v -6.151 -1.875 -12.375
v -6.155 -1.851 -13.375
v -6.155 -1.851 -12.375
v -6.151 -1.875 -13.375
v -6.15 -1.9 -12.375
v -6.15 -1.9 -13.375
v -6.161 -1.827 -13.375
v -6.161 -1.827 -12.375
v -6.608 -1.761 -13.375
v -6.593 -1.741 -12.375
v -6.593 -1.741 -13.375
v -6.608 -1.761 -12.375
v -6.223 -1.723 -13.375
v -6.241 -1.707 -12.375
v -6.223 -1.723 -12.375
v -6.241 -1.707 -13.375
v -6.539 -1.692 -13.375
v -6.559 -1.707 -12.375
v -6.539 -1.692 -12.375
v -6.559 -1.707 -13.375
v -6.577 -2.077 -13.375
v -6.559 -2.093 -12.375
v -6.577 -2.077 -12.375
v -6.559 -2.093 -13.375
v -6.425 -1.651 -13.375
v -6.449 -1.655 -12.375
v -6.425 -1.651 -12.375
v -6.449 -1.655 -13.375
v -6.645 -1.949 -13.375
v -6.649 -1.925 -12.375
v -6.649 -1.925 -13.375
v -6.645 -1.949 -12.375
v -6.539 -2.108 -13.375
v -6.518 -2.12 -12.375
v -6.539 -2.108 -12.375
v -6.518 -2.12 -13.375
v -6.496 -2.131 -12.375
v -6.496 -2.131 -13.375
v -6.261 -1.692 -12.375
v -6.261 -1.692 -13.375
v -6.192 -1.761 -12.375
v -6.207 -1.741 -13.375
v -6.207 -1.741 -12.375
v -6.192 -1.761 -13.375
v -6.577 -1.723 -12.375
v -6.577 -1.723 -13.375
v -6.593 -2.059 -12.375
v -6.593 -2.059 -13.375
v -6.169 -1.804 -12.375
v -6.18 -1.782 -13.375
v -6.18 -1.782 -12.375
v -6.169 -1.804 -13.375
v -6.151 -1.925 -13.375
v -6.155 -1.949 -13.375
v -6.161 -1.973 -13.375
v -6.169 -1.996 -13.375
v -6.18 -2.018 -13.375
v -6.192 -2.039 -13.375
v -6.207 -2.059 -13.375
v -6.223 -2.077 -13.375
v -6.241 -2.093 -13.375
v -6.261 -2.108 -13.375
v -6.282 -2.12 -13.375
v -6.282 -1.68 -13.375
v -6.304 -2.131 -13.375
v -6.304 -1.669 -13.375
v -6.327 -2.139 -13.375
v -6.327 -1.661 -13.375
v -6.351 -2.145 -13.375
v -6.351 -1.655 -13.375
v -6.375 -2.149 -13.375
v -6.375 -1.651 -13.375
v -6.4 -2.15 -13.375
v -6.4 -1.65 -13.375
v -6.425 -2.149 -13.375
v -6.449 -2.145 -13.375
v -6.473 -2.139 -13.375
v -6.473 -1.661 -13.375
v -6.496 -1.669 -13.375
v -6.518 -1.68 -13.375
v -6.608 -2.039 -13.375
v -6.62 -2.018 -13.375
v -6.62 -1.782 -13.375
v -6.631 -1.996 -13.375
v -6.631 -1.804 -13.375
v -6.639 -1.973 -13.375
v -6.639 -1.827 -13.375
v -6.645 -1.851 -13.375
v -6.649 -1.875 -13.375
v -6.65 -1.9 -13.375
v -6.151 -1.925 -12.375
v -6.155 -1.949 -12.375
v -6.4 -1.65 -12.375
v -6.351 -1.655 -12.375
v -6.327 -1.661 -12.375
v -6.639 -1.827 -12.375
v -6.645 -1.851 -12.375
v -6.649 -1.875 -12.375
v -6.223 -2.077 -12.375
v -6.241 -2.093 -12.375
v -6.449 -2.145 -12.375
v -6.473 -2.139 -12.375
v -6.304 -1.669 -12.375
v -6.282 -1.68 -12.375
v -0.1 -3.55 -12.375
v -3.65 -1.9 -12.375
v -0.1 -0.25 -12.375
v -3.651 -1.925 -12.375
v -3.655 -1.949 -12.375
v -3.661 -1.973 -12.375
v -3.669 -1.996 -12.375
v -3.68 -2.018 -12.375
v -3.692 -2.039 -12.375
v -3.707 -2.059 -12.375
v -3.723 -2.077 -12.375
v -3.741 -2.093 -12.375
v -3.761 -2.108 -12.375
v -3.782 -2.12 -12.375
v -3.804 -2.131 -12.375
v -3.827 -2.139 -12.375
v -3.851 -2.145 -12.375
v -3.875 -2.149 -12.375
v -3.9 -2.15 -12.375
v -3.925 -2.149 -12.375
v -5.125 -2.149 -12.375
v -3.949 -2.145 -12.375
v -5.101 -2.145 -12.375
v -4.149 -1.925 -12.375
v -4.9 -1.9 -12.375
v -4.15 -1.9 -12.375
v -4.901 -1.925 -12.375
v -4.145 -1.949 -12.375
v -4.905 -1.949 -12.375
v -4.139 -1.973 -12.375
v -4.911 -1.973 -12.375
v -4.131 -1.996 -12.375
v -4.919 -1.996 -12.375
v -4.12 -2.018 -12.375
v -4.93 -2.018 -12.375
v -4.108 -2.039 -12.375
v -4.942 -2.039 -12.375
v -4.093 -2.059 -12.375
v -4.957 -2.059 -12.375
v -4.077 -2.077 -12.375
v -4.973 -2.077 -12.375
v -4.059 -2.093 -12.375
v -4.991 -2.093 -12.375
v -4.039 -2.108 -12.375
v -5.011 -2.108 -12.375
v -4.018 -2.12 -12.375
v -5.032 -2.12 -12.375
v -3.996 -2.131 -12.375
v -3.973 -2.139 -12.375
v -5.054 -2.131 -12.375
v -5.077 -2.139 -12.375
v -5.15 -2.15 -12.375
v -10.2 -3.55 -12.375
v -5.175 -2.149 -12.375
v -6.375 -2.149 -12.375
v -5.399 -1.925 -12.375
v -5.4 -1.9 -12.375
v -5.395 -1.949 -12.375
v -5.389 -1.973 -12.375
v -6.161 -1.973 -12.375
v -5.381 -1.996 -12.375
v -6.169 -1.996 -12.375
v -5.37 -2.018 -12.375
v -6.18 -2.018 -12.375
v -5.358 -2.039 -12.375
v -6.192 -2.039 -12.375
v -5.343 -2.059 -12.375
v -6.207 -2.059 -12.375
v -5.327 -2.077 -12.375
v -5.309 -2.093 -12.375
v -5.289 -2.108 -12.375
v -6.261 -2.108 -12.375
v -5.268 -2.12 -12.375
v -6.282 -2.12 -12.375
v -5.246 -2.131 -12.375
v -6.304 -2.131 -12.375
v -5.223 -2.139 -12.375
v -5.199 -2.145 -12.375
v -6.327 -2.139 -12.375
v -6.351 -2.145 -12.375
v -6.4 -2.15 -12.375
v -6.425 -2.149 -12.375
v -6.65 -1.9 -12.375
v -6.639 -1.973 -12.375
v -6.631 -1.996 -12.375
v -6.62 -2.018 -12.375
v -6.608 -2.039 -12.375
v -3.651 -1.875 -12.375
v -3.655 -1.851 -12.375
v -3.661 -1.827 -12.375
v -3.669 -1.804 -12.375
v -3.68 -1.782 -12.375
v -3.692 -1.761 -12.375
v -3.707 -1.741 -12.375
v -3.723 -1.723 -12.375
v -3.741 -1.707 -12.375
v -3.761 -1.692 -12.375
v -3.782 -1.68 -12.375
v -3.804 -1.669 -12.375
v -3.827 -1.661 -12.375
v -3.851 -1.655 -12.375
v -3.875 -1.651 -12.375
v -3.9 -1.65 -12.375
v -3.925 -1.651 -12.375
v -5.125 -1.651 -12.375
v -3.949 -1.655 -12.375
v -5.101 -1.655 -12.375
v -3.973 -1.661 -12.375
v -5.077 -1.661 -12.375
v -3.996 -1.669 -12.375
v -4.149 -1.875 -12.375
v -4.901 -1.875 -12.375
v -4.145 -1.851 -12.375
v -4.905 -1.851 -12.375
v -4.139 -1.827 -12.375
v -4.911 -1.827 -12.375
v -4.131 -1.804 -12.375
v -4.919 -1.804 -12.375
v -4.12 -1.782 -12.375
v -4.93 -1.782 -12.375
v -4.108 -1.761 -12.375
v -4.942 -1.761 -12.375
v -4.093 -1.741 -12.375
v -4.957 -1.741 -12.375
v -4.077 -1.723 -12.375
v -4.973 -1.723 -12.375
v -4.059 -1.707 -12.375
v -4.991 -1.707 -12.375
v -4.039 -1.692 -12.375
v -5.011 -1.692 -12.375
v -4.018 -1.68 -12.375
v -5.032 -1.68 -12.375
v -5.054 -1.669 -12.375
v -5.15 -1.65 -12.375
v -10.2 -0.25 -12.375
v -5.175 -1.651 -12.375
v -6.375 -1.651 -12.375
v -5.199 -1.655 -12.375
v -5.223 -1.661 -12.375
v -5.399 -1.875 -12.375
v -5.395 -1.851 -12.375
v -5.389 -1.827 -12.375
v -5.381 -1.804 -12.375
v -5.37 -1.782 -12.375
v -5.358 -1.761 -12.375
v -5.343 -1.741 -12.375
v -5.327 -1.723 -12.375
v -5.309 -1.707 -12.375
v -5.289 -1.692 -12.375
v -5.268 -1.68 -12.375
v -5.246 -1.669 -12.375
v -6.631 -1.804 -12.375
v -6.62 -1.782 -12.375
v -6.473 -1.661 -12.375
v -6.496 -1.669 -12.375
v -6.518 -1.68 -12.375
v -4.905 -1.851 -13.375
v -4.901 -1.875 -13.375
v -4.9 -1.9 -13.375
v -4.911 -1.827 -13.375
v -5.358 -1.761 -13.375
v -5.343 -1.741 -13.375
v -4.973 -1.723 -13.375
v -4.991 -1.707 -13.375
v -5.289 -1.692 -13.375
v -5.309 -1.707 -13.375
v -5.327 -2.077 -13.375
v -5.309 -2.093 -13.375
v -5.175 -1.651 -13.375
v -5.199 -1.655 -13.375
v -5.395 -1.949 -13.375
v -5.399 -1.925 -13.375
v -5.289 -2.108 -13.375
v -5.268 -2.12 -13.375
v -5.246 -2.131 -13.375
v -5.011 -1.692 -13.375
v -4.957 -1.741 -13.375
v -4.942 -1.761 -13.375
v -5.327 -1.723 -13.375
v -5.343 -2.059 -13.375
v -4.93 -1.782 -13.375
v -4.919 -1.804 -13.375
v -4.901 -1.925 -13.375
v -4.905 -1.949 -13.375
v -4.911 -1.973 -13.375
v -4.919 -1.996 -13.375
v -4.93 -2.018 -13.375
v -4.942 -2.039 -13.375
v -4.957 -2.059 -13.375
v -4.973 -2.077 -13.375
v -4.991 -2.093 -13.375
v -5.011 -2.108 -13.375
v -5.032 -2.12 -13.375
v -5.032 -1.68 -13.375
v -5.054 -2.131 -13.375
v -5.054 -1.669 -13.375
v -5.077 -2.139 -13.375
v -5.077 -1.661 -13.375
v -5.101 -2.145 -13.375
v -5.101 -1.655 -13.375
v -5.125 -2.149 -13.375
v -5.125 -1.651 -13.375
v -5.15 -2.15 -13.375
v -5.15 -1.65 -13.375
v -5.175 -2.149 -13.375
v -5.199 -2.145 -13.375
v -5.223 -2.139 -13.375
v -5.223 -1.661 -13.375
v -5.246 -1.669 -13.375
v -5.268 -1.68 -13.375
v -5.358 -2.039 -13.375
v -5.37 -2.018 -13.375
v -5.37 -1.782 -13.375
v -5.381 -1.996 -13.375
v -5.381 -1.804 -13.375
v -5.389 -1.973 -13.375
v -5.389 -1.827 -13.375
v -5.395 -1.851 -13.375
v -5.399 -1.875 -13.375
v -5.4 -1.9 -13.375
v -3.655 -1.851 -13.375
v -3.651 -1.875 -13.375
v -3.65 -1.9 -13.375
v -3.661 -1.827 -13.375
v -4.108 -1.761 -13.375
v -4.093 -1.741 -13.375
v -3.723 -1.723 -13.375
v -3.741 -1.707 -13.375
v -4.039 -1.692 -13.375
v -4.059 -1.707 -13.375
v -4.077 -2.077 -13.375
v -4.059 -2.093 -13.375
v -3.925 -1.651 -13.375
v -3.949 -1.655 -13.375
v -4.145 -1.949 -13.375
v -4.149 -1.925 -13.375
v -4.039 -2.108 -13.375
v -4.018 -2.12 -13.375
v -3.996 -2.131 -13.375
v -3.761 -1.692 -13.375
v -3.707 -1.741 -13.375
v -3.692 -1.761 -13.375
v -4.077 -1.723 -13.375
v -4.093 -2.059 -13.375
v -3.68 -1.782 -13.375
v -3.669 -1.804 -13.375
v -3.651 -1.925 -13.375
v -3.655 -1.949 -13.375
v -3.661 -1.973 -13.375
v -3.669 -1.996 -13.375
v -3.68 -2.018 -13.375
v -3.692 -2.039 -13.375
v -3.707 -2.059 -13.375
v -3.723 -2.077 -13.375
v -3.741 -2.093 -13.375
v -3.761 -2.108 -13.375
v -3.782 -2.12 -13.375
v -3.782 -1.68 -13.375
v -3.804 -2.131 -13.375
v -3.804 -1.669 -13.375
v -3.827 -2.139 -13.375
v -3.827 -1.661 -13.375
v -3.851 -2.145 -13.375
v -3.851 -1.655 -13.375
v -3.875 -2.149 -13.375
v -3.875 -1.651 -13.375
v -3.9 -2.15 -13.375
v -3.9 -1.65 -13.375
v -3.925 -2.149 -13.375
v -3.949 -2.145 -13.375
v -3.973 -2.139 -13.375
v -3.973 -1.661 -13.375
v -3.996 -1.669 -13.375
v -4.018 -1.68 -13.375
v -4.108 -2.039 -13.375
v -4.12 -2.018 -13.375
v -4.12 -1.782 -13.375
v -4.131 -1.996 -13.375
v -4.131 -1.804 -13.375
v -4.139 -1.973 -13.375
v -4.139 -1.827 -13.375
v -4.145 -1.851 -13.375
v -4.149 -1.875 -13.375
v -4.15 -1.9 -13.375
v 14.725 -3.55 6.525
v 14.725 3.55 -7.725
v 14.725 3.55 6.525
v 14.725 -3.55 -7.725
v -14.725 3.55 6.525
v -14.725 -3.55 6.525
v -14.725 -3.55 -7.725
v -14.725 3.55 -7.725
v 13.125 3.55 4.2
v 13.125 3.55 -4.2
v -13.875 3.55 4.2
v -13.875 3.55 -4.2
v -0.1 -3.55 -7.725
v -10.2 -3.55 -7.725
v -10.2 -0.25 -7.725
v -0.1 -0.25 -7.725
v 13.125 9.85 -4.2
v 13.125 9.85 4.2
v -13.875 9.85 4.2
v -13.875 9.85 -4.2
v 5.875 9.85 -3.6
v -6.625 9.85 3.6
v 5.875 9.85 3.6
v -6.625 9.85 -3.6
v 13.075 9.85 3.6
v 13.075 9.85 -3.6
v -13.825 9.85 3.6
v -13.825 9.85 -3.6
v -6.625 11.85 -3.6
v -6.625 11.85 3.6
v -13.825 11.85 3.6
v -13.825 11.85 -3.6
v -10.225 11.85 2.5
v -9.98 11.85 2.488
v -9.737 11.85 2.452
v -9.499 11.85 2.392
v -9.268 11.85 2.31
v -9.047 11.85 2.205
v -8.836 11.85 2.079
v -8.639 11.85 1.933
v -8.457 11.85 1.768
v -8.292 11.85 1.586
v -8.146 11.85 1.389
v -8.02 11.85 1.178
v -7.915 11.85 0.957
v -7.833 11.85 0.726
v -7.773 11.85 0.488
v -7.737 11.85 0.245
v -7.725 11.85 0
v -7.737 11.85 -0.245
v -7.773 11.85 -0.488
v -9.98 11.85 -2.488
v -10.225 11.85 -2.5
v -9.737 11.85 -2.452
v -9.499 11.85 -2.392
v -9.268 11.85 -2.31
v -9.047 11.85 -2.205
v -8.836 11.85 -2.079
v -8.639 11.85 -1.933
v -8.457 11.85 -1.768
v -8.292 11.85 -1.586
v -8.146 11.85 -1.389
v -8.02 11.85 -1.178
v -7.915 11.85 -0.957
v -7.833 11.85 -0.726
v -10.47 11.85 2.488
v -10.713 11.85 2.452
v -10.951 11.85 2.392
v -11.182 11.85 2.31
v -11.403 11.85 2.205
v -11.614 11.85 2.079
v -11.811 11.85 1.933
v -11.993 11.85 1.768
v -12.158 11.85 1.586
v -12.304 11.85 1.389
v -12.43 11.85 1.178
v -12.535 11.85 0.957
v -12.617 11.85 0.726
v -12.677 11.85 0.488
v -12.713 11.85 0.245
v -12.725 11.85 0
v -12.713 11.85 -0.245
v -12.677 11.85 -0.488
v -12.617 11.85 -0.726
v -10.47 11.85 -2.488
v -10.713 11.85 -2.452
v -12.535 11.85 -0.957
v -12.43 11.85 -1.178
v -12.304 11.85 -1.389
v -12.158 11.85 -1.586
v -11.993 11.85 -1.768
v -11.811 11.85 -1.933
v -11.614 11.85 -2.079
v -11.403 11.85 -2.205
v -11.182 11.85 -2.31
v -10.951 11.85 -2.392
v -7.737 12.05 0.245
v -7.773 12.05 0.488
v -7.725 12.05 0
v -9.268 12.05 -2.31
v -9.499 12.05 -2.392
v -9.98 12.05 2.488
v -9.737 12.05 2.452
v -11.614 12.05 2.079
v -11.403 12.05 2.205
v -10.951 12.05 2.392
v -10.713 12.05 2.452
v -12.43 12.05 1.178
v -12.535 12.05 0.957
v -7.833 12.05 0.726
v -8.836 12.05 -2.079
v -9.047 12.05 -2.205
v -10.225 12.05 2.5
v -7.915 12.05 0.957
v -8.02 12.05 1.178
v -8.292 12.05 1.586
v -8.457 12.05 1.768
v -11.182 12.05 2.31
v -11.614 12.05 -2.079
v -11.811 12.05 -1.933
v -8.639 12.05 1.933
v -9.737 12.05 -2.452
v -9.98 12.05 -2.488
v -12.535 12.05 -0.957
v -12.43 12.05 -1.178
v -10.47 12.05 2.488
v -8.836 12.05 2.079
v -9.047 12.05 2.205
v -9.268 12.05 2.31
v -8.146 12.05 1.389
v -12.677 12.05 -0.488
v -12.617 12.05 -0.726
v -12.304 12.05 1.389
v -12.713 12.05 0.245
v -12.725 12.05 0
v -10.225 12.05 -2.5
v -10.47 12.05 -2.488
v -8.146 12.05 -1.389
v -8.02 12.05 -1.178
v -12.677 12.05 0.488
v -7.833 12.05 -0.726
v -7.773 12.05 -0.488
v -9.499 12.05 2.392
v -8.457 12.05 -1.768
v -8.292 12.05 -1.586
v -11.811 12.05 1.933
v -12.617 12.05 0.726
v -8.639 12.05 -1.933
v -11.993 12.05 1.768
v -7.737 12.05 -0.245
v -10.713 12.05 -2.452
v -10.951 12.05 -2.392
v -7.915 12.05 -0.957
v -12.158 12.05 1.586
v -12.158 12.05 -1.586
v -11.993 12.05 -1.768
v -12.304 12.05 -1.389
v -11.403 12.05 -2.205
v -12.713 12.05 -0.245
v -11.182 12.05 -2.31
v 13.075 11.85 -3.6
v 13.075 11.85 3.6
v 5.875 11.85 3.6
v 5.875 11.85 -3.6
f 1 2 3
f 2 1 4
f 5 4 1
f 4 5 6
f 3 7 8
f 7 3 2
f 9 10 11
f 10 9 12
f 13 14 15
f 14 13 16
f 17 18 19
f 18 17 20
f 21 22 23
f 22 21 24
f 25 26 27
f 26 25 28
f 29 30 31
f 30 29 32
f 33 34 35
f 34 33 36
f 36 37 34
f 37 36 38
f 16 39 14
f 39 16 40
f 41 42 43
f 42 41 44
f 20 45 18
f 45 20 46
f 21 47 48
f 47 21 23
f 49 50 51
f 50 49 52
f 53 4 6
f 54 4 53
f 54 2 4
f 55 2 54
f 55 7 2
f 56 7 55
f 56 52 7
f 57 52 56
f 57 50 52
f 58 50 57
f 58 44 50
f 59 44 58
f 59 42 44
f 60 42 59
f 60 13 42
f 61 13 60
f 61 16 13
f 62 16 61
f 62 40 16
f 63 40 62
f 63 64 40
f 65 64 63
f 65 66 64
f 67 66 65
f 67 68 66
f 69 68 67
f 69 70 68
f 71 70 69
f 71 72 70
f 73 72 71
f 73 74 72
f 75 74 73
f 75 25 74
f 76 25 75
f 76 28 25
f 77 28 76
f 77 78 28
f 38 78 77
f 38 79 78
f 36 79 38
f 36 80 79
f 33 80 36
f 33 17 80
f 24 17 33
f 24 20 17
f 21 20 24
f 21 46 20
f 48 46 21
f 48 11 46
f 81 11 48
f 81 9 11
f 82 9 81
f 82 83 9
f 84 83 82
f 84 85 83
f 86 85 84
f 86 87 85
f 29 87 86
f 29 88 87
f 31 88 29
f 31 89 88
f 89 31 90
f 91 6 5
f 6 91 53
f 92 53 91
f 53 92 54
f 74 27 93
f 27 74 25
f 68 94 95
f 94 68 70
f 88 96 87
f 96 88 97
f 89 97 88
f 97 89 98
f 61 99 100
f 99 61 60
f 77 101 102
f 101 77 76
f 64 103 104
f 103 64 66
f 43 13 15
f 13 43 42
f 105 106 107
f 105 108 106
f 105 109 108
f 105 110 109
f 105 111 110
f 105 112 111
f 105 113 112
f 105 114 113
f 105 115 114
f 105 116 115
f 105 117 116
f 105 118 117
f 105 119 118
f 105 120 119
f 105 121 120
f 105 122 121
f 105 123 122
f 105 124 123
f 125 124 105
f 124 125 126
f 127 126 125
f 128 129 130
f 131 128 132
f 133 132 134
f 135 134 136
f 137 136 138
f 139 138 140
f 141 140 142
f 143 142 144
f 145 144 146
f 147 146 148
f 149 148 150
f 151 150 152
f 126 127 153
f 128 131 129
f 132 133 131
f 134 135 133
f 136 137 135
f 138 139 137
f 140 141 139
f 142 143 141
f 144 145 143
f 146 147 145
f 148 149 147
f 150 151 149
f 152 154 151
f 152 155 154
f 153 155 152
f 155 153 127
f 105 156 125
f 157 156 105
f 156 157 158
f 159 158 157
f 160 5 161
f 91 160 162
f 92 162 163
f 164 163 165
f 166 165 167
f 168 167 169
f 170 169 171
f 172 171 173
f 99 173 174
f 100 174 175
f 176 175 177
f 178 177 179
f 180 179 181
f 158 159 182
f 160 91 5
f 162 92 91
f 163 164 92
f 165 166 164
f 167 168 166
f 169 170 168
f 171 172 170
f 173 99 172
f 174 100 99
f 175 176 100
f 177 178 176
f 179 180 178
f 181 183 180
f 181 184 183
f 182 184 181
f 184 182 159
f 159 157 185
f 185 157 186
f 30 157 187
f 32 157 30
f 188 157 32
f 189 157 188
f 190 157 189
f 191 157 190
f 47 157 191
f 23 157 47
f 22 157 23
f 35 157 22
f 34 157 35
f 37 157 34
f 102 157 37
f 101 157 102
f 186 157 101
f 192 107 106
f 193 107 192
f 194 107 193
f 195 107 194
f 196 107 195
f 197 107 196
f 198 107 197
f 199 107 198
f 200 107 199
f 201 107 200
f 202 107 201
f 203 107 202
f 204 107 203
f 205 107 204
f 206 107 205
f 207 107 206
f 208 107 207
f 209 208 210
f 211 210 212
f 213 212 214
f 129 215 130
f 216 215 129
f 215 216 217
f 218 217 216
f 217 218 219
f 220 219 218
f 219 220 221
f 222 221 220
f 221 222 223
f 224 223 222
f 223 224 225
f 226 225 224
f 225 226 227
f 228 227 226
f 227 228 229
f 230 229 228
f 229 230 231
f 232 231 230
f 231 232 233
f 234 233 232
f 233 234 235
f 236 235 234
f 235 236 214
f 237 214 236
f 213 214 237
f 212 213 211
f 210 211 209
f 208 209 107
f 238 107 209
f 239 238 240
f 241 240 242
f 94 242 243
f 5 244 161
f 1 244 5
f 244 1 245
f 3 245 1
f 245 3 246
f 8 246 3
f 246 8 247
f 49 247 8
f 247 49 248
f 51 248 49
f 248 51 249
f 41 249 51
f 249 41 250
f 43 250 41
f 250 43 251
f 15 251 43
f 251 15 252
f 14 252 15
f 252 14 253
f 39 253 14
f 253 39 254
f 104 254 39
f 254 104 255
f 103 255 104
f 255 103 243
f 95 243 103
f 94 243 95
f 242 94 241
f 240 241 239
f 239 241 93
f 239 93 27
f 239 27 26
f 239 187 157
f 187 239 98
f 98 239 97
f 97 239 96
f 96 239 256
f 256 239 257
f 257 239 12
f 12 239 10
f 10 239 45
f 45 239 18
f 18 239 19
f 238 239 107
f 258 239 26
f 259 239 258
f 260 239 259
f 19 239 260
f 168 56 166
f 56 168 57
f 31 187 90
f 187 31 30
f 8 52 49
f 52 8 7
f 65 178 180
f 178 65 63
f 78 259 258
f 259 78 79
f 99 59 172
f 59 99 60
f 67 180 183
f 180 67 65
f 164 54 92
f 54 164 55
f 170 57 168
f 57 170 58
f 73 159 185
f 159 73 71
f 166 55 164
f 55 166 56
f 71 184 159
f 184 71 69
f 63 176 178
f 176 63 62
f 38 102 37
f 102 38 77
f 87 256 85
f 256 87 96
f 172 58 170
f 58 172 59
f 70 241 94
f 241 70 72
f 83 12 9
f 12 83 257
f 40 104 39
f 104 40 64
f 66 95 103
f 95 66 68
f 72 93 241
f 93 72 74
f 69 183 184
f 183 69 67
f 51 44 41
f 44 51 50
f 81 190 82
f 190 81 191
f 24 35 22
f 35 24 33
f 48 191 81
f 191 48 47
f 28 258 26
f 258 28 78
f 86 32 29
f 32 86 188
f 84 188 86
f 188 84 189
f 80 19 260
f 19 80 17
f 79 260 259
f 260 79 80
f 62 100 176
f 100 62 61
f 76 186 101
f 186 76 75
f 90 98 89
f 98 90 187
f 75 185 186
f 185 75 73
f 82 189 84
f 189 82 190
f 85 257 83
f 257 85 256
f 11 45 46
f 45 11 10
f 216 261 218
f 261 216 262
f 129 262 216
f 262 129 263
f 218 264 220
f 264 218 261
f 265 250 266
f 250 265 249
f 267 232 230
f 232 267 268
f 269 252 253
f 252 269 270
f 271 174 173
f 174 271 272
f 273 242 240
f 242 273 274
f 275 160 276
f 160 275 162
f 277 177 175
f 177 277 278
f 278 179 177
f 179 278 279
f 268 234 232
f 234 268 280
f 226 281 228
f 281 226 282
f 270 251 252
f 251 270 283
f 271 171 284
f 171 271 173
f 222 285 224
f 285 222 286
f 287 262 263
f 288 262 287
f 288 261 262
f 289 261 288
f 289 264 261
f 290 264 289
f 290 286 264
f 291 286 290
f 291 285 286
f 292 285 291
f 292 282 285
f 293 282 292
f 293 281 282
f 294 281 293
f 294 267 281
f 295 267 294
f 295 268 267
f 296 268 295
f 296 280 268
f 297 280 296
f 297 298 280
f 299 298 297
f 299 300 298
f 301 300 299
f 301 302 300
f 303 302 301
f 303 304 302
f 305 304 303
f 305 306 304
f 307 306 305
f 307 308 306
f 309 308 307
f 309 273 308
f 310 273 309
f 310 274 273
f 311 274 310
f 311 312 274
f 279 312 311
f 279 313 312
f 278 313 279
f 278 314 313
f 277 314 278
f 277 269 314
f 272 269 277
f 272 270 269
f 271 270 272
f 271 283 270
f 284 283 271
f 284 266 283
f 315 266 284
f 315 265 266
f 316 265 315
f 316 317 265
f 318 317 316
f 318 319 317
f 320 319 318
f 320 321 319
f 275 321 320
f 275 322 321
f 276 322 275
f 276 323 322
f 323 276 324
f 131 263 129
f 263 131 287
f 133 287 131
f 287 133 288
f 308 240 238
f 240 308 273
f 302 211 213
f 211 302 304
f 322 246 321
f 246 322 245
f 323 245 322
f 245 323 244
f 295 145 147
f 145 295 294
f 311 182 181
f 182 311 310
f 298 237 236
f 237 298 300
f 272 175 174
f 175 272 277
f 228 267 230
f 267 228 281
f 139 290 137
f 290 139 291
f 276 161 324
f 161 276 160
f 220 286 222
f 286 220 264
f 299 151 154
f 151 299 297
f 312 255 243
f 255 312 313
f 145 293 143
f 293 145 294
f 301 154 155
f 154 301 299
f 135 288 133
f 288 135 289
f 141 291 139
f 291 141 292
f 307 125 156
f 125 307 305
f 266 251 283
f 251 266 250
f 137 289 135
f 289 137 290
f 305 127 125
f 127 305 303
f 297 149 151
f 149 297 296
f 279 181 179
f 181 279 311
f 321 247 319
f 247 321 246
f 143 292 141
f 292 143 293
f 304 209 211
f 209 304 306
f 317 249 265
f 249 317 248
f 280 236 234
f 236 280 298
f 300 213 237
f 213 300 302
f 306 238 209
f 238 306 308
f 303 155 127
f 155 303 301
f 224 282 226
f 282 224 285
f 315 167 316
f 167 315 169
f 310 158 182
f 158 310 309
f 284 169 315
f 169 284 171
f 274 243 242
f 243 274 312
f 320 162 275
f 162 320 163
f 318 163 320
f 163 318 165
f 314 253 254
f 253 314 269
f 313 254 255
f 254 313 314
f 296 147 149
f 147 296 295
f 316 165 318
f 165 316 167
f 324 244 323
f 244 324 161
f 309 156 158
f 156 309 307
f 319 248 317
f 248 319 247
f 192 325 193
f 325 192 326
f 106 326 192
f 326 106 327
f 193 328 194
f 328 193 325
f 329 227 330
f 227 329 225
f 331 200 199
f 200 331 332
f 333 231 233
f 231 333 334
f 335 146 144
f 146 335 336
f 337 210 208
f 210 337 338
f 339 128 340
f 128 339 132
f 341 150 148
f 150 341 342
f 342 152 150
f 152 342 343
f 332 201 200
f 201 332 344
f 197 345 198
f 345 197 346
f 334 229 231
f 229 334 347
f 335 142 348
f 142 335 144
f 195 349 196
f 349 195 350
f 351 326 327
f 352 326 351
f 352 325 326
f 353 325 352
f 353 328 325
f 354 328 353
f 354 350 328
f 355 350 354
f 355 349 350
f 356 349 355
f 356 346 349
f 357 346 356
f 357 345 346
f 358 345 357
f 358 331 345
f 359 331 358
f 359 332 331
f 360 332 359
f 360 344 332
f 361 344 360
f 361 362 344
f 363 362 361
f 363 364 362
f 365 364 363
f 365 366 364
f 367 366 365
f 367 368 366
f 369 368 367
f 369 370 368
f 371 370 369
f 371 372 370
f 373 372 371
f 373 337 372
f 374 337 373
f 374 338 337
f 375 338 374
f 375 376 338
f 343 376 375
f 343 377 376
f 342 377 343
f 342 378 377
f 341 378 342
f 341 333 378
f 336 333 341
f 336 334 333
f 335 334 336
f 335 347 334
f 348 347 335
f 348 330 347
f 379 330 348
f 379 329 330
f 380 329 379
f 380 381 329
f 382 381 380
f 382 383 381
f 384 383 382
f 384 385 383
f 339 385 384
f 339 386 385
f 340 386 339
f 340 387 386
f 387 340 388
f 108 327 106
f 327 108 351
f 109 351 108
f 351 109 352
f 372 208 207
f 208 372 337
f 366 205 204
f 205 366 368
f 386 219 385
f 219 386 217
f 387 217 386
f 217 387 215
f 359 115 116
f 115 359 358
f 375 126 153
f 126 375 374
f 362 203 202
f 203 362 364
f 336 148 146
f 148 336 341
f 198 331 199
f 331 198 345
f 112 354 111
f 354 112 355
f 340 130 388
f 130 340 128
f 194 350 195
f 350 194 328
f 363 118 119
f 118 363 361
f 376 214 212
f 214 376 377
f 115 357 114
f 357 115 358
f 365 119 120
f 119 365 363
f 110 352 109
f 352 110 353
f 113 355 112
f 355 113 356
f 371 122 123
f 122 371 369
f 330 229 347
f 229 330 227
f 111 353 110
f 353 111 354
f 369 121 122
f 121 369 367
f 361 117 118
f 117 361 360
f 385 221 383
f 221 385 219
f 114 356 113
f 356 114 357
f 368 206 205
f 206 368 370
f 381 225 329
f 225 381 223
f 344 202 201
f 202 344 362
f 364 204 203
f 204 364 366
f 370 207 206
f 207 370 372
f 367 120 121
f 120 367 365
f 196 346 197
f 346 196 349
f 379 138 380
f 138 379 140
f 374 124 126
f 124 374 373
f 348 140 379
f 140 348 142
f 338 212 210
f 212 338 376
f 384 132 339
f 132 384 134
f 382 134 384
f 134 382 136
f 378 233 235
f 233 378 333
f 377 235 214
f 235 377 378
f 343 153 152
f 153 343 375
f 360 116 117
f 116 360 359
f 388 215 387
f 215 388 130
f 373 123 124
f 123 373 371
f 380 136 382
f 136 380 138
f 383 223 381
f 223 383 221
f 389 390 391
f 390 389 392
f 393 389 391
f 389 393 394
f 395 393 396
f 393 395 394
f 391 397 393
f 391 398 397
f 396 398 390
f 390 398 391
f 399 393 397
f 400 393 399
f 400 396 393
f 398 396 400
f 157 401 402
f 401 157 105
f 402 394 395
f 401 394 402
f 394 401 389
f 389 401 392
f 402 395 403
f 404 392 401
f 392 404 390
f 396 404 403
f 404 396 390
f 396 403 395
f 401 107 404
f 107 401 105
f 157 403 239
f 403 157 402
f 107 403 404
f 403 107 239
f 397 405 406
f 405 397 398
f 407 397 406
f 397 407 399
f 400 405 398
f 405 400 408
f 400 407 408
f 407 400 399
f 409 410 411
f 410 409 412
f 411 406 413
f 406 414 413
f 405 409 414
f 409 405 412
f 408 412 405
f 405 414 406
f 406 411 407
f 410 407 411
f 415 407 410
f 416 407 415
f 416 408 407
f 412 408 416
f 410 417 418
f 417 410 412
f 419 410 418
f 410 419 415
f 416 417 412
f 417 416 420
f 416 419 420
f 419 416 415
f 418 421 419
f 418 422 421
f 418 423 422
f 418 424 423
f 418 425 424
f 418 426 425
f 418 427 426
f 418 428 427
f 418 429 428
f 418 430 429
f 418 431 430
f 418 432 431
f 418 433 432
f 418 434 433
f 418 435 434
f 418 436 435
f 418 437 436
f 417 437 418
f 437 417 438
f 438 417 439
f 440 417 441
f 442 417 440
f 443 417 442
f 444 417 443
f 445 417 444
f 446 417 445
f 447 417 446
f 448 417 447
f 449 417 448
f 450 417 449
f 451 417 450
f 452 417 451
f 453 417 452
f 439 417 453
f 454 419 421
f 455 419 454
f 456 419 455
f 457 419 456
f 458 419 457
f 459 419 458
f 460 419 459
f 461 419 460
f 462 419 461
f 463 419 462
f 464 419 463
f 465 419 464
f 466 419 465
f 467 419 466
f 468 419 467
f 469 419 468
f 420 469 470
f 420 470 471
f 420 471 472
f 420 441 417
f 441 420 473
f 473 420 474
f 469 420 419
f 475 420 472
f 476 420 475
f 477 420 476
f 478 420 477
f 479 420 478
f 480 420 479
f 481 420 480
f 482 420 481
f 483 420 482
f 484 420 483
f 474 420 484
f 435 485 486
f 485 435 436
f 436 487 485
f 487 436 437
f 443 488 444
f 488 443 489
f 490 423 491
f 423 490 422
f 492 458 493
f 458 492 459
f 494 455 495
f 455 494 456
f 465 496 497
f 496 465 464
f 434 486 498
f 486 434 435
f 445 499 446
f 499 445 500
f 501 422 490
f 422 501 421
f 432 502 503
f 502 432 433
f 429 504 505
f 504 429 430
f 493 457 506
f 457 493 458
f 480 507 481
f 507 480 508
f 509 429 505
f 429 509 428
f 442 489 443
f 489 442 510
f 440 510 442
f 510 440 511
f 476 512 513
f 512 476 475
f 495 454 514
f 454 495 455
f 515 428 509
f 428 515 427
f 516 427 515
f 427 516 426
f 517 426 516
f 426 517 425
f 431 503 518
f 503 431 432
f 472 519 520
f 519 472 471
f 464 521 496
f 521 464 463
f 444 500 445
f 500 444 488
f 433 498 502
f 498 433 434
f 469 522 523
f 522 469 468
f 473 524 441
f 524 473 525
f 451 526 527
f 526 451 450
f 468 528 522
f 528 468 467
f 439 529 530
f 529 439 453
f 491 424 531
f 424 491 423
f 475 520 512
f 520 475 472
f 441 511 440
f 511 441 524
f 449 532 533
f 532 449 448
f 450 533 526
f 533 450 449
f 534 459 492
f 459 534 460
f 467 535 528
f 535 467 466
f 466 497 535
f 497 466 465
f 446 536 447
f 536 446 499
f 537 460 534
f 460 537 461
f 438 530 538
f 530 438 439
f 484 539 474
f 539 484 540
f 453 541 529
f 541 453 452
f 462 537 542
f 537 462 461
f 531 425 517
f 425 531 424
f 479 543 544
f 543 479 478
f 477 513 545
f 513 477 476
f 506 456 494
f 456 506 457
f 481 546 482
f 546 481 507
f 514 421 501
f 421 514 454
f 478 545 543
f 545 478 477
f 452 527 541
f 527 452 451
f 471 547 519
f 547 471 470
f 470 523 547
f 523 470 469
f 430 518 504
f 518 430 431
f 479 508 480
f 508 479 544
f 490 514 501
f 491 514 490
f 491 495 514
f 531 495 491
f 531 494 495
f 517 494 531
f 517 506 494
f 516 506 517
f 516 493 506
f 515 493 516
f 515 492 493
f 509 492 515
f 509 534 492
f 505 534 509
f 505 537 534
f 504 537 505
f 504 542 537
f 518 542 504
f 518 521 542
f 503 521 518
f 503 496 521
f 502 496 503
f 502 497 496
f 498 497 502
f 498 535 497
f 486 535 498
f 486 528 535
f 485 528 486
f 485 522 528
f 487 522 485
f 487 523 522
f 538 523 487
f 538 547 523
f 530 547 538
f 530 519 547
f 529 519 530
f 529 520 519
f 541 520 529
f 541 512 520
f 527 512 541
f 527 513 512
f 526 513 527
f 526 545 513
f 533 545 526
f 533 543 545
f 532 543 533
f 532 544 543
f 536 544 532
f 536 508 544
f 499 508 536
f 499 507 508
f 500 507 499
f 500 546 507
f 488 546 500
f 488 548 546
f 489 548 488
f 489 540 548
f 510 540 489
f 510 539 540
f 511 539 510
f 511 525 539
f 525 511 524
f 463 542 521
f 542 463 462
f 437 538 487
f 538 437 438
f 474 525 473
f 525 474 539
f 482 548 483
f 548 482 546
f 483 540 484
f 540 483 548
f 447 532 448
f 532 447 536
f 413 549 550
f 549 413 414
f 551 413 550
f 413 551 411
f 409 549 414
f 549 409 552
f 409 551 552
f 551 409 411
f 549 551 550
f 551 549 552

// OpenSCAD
// Sharp GP2Y0D413K0F Distance Sensor
// All dimensions in mm
// Center of the main case is at origin (0,0,0)
// +Z is up, +Y is front (lens side)

$fn = 64;

// --- Parameters ---
// 1. Main Case
case_w = 29.45;
case_h = 13.05;
case_d = 7.1;

// 2. PWB (Printed Wiring Board)
pwb_w = 29.45;
pwb_h = 1.2;
pwb_d = 7.1;

// 3. Connector
conn_w = 10.1;
conn_h = 4.65; // Total height 18.9 - 13.05(case) - 1.2(PWB) = 4.65
conn_d = 3.3;
// Connector position: based on bottom view, the center of the 4.15 opening 
// is 7.5 + 4.15/2 = 9.575 from the left edge.
conn_x = -case_w/2 + 9.575; 
// Aligned to the back (-Y) of the main case
conn_y = -case_d/2 + conn_d/2; 
conn_z = -case_h/2 - pwb_h - conn_h/2;

// 4. Lens Case (Protrusion)
// Width calculated to enclose both 7.2mm lens tubes
lens_case_w = 27.0; 
lens_case_h = 8.4;
lens_case_d = 6.3;

// Lens Tubes (Front-most 2mm protrusions)
lens_tube_w = 7.2;
lens_tube_h = 7.2;
lens_tube_d = 2.0;

// Lens Centers
lens1_x = -case_w/2 + 4.5;       // Left: Light emitter
lens2_x = lens1_x + 19.7;        // Right: Light detector
lens_case_x = (lens1_x + lens2_x) / 2;


// --- Modules ---

// 1. Main Case (Carbonic ABS)
color("#2c2c2c")
cube([case_w, case_d, case_h], center=true);

// 2. PWB
color("#2e472d")
translate([0, 0, -case_h/2 - pwb_h/2])
cube([pwb_w, pwb_d, pwb_h], center=true);

// 3. Connector
color("#e0e0e0")
translate([conn_x, conn_y, conn_z])
cube([conn_w, conn_d, conn_h], center=true);

// 3.1 Connector Pins (Simplified representation of JCTC 12001W90-3P-HF)
color("#a0a0a0")
for(i=[-1, 0, 1]) {
    translate([conn_x + i*1.25, conn_y, conn_z - conn_h/2 - 0.5])
    cylinder(h=1.0, r=0.25, center=true);
}

// 4. Lens Case Base
color("#2c2c2c")
translate([lens_case_x, case_d/2 + lens_case_d/2, 0])
cube([lens_case_w, lens_case_d, lens_case_h], center=true);

// 5. Light Emitter (Left)
// Tube
color("#2c2c2c")
translate([lens1_x, case_d/2 + lens_case_d + lens_tube_d/2, 0])
cube([lens_tube_w, lens_tube_d, lens_tube_h], center=true);

// Lens (Circular Window)
color("#1a1a2e")
translate([lens1_x, case_d/2 + lens_case_d + lens_tube_d, 0])
rotate([90, 0, 0])
cylinder(h=0.4, r=2.5, center=true);

// 6. Light Detector (Right)
// Tube
color("#2c2c2c")
translate([lens2_x, case_d/2 + lens_case_d + lens_tube_d/2, 0])
cube([lens_tube_w, lens_tube_d, lens_tube_h], center=true);

// Lens (Rectangular Window)
color("#1a1a2e")
translate([lens2_x, case_d/2 + lens_case_d + lens_tube_d - 0.2, 0])
cube([5.0, 0.4, 5.0], center=true);
